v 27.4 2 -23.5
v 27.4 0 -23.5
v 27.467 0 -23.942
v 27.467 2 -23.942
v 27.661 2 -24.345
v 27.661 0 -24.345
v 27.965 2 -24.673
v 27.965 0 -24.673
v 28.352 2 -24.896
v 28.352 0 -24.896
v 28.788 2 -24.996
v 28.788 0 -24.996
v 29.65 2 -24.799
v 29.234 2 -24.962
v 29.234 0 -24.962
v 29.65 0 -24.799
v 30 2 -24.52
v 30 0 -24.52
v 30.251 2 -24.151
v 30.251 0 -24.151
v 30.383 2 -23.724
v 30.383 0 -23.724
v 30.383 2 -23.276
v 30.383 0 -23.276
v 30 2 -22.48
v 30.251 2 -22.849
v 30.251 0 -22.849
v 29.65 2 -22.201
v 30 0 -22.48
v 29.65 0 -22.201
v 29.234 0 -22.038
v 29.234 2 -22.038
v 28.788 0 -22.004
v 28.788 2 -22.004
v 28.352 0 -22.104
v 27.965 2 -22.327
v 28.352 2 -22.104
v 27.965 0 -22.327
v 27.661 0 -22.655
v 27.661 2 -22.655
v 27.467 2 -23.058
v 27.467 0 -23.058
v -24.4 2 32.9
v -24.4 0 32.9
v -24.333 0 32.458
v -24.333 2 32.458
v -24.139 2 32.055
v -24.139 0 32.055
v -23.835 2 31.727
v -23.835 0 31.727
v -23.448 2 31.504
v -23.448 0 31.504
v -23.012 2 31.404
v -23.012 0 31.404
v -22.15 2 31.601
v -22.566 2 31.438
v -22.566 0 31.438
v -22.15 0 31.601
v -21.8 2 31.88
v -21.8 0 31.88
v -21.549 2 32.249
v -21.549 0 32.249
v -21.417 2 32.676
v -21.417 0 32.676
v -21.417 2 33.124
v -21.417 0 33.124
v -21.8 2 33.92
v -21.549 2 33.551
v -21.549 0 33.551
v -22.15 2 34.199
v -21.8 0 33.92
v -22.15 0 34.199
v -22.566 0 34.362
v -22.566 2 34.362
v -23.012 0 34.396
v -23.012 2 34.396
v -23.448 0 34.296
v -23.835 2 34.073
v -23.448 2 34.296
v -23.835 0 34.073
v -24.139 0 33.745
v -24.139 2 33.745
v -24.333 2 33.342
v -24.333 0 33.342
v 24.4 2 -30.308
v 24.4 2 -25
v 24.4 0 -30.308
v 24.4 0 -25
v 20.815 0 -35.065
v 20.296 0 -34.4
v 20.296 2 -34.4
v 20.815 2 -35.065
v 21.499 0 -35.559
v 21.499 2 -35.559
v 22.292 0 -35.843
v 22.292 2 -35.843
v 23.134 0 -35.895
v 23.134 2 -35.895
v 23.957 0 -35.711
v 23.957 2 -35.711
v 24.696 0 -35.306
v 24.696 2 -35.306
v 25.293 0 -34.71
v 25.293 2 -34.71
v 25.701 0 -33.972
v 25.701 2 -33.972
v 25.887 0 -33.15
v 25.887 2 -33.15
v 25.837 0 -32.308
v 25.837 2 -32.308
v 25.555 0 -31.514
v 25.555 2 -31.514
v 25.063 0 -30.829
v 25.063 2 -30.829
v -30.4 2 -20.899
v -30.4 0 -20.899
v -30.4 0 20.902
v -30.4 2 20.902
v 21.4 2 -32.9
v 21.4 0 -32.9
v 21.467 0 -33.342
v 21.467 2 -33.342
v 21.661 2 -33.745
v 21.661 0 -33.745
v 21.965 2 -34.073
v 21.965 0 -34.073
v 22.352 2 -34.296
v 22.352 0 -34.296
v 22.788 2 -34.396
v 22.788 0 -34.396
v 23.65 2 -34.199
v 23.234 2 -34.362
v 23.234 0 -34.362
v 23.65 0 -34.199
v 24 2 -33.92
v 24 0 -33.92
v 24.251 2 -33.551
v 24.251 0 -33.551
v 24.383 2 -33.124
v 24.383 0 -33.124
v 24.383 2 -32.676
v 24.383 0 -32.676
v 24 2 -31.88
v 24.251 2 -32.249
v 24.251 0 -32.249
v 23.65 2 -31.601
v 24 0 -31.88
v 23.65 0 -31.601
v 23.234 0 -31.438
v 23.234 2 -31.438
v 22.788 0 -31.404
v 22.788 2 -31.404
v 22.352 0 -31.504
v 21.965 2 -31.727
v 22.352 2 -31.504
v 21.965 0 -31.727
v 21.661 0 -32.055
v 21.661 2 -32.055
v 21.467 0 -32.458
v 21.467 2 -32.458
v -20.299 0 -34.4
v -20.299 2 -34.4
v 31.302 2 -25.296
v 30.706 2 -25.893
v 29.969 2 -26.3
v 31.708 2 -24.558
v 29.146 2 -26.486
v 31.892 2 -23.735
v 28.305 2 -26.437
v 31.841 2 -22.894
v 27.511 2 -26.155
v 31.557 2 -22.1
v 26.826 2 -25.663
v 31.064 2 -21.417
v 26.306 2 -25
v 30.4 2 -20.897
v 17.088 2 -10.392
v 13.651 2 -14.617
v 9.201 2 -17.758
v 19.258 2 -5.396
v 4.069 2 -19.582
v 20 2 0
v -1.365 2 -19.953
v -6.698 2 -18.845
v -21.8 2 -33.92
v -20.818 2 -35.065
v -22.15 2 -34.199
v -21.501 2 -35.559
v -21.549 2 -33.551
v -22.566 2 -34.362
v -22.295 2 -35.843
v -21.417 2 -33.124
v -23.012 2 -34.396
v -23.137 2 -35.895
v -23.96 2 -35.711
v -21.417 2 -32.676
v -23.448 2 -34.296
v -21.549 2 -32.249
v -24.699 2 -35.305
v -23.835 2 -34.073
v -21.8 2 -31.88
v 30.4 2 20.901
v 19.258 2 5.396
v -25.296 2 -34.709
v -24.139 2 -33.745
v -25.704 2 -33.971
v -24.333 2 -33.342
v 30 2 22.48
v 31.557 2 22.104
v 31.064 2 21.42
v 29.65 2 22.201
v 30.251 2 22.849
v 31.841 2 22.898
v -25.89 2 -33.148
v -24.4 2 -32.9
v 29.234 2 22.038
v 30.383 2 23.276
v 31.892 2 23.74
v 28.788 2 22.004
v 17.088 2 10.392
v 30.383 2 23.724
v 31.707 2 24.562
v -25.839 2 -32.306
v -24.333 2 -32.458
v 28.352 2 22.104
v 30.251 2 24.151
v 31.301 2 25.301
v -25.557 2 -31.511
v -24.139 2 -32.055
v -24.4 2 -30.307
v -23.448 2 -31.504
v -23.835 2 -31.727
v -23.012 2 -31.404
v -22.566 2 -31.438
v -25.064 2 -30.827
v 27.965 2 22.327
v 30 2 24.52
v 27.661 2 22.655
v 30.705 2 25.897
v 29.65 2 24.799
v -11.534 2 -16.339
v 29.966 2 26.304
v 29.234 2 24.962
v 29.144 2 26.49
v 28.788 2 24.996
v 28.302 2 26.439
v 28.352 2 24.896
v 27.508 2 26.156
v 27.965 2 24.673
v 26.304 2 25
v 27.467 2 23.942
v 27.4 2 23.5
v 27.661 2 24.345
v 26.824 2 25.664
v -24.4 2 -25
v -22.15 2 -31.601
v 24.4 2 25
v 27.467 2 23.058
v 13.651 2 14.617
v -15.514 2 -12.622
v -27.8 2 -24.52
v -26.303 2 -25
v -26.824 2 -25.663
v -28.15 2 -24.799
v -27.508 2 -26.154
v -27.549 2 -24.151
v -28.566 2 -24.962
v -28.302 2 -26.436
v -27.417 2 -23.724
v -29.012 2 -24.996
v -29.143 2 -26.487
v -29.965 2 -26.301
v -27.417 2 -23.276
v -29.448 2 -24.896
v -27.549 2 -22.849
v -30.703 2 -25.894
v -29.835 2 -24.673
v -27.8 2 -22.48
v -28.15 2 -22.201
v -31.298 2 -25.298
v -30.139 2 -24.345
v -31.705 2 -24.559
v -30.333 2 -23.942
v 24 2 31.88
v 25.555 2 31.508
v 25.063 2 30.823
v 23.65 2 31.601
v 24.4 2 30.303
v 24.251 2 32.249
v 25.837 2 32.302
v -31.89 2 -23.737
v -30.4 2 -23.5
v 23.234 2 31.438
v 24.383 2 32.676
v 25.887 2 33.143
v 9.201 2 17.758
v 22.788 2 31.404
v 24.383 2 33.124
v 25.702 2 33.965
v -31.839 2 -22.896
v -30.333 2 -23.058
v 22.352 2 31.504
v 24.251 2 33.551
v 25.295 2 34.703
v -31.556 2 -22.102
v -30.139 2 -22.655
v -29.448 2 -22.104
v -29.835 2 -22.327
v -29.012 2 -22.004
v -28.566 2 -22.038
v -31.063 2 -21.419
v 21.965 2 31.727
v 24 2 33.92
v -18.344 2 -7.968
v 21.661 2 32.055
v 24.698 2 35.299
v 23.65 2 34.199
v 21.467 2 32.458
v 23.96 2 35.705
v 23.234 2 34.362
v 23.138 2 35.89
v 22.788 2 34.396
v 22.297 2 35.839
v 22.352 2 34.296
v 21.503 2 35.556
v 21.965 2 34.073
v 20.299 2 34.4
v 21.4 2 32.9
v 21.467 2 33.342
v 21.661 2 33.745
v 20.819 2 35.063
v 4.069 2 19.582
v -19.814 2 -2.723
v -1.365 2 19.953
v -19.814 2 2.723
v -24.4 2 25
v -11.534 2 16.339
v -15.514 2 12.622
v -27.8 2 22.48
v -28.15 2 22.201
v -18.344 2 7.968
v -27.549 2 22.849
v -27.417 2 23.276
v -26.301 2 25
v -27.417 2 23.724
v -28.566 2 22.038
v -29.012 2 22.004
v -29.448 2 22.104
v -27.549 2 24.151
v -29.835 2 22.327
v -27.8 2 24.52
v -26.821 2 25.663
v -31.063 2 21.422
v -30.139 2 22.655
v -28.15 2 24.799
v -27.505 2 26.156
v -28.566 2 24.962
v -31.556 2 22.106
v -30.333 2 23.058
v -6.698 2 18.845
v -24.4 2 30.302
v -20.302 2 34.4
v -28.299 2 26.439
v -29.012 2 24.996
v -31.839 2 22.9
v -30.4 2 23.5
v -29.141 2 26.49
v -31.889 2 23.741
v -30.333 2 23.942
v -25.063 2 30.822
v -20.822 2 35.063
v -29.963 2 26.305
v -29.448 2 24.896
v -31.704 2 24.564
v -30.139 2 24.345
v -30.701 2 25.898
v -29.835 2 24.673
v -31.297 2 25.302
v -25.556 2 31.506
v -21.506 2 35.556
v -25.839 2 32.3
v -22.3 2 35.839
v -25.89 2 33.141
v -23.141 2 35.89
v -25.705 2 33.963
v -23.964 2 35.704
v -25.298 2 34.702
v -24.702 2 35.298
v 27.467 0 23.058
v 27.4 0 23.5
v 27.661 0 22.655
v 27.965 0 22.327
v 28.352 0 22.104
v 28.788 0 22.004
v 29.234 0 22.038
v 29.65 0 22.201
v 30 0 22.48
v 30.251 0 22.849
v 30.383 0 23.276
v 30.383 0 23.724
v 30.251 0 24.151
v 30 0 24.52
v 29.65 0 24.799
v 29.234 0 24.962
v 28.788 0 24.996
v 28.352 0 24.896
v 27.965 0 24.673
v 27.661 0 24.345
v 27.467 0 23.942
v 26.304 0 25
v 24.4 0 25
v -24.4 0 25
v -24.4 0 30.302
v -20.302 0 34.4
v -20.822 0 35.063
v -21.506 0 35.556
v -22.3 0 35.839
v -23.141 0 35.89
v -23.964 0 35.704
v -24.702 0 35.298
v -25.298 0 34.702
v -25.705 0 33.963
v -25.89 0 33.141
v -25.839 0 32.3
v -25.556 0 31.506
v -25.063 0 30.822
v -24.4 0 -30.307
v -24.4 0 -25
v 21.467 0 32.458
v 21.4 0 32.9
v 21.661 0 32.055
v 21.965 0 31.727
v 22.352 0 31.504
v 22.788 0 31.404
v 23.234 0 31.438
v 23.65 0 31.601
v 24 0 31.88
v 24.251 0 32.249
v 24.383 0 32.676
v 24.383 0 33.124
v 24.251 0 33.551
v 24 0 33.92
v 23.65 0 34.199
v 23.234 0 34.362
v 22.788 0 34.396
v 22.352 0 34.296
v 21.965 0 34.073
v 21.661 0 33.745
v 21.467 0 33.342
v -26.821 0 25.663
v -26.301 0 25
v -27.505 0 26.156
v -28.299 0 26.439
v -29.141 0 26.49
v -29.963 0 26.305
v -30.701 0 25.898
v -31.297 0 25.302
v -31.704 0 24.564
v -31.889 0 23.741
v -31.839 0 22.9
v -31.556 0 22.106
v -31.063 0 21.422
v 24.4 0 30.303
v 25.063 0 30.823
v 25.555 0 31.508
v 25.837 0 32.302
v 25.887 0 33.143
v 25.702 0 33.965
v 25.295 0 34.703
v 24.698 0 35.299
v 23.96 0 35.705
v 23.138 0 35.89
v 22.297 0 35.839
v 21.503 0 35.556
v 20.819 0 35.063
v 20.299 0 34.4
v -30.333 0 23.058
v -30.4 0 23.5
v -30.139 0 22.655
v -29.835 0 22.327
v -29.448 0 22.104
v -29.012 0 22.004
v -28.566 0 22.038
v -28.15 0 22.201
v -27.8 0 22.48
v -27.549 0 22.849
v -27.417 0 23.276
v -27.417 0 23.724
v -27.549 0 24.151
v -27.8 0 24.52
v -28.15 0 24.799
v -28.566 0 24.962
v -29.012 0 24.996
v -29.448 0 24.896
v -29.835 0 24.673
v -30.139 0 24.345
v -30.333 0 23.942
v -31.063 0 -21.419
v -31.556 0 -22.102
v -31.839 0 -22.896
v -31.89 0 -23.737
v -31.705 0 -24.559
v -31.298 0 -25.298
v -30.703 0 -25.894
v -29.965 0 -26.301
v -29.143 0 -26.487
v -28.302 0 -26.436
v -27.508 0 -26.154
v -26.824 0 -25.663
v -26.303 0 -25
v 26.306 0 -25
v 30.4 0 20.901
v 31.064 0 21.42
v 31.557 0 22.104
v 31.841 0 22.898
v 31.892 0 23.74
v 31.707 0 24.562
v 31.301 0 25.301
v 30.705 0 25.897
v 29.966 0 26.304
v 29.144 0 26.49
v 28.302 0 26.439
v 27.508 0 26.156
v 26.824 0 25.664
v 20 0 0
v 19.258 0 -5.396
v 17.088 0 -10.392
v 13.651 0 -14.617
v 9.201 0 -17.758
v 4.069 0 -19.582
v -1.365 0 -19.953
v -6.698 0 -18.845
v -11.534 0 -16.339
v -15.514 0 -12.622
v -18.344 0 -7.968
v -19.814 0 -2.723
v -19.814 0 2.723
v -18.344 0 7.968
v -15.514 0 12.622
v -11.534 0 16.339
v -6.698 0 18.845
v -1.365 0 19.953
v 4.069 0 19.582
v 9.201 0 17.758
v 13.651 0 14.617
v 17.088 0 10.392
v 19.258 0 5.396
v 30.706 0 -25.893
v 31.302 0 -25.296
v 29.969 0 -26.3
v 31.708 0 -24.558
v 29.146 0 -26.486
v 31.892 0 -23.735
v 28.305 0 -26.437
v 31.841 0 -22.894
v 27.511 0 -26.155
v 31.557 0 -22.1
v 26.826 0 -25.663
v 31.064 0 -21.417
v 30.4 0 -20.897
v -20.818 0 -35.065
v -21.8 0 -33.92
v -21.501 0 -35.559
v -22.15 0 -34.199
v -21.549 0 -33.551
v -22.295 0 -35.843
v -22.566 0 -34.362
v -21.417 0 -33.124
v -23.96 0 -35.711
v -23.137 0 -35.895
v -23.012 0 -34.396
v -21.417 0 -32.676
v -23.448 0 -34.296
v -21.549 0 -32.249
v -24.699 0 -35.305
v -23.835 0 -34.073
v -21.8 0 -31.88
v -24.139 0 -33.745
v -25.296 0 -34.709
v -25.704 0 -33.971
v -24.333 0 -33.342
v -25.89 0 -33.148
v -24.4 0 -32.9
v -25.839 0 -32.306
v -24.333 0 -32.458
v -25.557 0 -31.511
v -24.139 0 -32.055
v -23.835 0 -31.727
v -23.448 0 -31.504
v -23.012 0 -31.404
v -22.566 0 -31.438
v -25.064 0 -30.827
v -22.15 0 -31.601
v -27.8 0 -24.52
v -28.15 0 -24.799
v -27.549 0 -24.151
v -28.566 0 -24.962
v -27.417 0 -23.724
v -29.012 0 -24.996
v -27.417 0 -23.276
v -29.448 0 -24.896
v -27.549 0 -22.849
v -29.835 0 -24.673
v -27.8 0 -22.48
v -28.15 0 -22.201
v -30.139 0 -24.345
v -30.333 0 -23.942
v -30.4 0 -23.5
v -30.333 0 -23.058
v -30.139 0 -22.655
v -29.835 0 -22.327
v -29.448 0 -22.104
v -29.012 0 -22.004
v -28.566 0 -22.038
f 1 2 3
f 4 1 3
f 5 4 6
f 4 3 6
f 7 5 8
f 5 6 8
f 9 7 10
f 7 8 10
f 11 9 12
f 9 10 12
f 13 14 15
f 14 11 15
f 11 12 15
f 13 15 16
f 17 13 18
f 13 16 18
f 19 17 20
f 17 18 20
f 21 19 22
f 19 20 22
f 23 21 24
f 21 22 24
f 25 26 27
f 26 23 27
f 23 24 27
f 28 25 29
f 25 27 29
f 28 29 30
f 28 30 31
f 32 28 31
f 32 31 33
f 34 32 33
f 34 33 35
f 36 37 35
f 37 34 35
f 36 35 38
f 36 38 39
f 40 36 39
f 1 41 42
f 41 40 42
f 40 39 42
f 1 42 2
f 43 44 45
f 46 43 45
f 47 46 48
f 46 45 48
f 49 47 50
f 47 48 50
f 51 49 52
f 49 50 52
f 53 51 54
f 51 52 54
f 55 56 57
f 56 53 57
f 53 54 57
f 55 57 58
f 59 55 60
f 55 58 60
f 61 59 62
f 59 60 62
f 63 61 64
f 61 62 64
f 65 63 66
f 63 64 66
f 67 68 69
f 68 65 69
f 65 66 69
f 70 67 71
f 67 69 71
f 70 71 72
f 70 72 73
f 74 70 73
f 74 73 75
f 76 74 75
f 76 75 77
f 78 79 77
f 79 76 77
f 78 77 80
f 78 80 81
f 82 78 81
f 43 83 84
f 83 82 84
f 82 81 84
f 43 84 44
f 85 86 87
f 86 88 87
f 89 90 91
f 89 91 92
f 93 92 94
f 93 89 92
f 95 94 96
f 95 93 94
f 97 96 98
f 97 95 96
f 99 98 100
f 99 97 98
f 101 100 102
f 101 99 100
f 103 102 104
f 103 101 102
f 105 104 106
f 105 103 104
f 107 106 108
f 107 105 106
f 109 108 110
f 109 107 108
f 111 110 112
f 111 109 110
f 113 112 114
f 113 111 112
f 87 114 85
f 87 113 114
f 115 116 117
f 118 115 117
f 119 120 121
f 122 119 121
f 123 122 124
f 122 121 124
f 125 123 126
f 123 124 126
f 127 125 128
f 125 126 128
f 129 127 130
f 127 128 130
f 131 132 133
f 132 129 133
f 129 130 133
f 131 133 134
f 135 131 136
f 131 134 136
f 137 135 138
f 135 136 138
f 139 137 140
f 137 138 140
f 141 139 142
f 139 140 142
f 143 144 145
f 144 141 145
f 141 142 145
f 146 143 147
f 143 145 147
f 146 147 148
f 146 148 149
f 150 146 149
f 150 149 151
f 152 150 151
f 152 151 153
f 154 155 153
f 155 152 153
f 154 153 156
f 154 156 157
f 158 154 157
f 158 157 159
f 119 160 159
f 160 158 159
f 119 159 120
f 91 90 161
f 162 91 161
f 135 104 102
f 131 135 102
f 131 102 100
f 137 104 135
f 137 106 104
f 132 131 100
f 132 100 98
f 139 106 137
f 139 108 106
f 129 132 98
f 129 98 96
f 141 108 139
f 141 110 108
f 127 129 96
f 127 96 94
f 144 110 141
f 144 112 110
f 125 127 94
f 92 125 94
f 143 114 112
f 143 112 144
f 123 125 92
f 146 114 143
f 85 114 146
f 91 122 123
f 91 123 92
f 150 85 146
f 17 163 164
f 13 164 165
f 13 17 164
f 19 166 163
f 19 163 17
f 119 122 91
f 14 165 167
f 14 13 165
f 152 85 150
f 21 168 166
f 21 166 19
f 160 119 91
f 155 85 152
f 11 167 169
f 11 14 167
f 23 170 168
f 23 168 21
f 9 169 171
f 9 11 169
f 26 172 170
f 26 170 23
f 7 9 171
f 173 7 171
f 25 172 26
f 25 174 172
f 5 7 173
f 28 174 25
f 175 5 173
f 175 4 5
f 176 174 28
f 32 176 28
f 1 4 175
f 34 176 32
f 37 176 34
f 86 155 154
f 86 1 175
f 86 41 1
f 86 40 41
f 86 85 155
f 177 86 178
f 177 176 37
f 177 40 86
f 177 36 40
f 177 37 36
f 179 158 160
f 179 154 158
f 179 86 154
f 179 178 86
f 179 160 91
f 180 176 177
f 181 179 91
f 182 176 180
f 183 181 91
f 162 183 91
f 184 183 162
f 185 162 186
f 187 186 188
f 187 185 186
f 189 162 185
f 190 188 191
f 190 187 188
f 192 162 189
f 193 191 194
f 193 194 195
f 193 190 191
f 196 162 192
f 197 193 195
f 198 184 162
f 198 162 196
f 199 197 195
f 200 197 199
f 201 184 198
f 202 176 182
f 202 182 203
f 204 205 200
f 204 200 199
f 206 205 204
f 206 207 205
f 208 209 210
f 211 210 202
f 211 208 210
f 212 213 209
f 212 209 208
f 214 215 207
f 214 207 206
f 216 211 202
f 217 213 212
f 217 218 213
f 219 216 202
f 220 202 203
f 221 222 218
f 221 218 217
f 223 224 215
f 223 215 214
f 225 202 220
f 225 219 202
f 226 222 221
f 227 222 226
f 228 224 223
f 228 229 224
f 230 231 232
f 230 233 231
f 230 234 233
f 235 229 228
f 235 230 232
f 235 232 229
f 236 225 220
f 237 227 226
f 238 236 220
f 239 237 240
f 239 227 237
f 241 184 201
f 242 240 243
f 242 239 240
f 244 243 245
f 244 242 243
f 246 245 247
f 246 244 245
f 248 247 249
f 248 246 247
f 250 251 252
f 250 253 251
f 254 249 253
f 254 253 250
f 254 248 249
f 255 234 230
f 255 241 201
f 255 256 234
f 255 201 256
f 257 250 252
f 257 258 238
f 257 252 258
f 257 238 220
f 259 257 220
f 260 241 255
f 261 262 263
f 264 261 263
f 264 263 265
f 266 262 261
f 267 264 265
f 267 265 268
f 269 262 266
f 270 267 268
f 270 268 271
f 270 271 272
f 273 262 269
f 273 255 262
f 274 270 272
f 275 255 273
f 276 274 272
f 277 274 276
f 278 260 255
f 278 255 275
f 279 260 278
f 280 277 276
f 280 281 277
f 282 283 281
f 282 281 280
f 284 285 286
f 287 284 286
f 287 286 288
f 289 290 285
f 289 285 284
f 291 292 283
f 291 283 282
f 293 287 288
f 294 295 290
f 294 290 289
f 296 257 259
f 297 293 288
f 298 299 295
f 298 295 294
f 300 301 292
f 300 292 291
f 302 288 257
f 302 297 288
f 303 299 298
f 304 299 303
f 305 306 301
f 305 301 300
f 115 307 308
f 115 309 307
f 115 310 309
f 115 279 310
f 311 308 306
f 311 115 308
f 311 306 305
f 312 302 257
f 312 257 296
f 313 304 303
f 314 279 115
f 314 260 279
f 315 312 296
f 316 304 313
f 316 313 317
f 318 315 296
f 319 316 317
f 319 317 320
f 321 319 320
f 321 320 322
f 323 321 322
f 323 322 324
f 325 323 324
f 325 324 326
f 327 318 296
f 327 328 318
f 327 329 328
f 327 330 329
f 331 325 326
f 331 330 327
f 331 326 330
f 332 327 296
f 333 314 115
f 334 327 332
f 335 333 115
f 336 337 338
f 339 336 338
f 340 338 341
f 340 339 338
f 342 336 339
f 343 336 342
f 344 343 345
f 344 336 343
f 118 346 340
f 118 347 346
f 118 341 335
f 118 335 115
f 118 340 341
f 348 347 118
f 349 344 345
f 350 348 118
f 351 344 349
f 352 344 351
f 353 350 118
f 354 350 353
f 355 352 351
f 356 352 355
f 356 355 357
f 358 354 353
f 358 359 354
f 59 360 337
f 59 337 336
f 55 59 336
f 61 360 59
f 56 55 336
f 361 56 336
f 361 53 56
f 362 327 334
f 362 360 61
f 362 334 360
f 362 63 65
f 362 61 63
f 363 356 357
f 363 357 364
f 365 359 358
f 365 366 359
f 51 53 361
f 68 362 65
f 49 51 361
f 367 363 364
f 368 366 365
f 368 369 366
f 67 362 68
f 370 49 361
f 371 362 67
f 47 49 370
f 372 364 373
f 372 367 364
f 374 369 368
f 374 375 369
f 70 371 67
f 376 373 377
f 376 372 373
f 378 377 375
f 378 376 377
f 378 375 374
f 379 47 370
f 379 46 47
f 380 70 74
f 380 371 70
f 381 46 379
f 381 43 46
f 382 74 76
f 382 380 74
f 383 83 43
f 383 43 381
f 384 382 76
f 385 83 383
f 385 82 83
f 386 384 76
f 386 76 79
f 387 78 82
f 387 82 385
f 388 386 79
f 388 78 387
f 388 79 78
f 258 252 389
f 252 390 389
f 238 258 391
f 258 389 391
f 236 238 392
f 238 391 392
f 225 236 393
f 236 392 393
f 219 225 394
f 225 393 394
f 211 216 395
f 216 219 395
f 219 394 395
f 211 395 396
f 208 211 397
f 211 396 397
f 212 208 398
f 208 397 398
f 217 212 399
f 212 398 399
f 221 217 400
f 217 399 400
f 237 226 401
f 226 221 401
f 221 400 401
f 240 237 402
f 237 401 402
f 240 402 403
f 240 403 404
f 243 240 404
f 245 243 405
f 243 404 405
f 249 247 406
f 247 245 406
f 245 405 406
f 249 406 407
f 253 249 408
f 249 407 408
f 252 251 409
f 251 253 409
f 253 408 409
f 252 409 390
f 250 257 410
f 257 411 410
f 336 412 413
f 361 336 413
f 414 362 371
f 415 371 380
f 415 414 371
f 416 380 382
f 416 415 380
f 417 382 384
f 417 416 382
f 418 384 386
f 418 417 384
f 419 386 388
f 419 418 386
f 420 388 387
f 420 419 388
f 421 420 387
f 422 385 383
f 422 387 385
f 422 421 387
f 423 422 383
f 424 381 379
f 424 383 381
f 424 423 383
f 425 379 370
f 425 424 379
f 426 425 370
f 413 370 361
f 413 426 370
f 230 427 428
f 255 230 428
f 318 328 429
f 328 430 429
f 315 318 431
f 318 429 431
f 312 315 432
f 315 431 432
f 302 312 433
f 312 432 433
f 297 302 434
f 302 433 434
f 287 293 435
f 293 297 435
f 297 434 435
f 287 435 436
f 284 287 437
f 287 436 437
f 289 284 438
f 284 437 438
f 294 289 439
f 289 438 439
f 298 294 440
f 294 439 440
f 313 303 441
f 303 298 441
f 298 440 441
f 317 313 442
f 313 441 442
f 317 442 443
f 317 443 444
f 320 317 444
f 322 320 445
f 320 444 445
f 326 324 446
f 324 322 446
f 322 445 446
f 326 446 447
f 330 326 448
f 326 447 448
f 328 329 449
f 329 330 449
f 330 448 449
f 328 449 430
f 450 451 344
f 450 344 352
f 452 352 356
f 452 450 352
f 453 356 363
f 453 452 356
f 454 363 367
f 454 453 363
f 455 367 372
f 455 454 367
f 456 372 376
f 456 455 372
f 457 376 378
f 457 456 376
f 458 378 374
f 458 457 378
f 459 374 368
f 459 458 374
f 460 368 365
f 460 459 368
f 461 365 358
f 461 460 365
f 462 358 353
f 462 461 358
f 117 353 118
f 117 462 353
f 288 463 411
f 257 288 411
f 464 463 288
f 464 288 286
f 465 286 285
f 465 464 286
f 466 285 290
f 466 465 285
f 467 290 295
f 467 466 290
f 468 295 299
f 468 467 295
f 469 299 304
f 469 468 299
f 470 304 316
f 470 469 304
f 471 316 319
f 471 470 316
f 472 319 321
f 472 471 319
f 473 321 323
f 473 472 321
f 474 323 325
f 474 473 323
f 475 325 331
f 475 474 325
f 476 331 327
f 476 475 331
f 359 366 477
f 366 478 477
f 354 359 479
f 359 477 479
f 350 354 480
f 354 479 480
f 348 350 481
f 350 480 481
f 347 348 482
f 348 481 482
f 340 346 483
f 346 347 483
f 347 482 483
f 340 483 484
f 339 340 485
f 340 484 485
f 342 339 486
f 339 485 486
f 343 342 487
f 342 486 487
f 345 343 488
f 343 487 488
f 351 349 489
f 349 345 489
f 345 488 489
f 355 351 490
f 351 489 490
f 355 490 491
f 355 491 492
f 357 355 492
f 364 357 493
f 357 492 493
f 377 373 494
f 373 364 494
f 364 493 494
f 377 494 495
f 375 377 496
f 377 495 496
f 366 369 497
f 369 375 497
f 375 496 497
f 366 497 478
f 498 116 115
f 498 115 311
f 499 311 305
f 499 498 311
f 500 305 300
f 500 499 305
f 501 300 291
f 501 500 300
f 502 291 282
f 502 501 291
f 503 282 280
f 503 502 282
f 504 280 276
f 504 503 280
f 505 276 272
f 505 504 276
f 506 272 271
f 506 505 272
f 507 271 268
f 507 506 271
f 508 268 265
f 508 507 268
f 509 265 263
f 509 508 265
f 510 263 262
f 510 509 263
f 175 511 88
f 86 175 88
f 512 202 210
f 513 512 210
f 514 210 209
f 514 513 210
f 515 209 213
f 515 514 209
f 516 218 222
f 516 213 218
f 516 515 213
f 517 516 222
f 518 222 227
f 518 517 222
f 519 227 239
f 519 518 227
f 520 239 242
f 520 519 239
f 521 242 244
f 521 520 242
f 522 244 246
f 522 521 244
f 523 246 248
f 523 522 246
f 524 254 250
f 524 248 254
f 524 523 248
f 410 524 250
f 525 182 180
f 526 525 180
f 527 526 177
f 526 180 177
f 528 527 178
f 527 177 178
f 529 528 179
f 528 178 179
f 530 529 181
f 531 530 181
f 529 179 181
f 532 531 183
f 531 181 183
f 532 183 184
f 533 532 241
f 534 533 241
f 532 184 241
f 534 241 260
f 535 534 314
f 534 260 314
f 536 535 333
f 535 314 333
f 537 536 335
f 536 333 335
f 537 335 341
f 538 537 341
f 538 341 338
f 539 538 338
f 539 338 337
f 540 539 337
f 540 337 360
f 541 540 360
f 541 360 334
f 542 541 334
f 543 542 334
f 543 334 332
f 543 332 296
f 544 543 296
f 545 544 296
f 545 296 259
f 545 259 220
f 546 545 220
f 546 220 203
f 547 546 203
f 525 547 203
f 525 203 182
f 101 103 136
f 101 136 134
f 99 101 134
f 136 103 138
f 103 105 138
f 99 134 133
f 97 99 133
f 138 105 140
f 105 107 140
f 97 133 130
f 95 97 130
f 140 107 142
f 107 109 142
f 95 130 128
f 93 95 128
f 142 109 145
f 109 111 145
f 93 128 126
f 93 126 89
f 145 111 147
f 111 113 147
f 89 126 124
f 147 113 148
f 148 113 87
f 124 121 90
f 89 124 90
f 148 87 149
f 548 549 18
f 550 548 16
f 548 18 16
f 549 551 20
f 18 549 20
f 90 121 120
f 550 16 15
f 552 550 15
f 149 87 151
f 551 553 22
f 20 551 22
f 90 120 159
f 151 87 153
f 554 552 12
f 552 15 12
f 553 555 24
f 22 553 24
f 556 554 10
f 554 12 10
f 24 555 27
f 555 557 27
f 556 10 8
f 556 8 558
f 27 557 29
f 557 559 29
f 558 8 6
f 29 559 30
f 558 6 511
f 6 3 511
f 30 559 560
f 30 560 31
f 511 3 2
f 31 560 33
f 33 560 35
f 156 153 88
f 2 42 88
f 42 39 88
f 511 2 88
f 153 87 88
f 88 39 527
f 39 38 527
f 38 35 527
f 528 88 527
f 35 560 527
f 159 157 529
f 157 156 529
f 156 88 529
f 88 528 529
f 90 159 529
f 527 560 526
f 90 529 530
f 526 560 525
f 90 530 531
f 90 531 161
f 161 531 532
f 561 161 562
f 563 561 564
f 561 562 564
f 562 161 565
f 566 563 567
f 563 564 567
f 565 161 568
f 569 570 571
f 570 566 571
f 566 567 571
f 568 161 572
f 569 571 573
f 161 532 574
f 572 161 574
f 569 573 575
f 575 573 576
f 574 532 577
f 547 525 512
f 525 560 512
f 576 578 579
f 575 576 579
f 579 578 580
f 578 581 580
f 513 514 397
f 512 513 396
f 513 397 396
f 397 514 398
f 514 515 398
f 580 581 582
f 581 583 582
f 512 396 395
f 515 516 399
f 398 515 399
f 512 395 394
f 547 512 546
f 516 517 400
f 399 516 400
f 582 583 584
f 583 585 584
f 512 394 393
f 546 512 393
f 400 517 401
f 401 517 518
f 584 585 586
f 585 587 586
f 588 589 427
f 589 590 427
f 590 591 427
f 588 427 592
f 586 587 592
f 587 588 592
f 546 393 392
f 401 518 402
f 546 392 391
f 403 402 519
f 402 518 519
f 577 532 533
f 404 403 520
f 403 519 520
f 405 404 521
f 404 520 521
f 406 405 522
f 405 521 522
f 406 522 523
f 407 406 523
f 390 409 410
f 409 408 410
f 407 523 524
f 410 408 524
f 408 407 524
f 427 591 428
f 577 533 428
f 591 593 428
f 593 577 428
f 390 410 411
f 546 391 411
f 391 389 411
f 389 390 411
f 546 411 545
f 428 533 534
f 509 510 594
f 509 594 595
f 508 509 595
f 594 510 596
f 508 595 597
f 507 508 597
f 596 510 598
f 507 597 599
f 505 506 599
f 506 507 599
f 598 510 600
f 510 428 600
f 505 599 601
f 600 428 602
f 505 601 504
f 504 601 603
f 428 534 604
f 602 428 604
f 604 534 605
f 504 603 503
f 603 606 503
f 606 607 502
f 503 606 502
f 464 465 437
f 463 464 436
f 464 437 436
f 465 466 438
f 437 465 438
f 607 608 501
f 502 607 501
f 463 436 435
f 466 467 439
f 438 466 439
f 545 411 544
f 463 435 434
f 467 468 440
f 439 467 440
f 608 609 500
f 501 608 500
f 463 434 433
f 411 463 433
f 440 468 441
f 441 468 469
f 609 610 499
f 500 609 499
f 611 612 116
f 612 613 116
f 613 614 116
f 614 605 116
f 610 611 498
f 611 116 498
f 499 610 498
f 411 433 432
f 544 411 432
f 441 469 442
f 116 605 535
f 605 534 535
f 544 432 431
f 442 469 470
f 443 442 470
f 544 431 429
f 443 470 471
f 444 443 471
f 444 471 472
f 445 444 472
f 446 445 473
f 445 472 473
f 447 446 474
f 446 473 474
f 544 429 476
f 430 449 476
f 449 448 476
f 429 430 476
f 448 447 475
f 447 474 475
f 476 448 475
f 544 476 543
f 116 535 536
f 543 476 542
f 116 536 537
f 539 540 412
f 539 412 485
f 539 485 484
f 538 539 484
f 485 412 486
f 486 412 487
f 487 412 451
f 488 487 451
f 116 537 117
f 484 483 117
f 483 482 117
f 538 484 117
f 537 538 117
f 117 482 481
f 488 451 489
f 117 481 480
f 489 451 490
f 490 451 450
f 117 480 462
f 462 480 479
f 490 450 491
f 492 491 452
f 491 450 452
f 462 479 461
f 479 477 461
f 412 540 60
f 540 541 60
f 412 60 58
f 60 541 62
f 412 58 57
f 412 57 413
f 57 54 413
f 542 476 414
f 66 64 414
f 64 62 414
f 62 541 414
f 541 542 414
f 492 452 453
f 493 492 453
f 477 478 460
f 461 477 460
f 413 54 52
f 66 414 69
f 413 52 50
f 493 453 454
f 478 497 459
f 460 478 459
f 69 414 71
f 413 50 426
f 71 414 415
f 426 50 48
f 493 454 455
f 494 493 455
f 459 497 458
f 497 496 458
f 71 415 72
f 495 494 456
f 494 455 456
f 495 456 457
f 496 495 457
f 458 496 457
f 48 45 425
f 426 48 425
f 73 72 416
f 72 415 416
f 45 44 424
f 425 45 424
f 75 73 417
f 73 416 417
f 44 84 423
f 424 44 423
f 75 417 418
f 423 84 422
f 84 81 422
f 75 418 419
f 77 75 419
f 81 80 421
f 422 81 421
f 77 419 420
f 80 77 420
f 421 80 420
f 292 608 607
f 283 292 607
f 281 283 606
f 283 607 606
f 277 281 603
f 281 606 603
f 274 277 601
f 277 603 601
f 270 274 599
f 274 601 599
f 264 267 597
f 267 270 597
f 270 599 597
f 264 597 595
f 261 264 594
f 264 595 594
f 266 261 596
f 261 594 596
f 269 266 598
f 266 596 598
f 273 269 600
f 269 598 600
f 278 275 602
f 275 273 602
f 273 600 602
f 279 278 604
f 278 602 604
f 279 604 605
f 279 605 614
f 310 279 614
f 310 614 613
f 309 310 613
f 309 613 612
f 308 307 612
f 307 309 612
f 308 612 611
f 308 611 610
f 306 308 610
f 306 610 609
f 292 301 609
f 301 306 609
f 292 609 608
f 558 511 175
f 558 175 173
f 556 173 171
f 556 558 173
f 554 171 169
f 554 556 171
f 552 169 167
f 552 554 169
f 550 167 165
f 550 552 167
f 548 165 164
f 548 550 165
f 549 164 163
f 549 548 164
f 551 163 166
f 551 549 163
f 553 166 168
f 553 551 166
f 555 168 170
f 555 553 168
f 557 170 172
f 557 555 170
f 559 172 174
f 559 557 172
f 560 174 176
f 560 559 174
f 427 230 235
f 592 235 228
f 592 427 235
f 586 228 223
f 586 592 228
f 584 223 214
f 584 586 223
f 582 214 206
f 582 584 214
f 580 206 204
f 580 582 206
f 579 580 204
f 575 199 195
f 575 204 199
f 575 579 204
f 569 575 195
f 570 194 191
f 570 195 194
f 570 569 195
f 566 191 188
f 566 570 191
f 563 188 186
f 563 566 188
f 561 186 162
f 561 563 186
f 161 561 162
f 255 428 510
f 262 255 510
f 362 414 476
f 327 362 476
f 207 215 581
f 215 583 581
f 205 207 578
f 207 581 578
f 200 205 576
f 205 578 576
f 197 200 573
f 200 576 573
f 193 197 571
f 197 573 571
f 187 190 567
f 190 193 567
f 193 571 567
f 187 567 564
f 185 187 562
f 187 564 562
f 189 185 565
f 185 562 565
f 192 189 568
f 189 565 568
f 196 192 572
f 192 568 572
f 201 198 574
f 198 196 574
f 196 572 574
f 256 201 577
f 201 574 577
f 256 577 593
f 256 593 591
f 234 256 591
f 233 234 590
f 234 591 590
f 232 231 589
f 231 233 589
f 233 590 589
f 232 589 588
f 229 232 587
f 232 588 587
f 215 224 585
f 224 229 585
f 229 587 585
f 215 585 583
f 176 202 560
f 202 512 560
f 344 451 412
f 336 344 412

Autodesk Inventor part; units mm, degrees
ref_plane "YZ Plane" through (0, 0, 0) normal (1, 0, 0) x (0, 1, 0)
ref_plane "XZ Plane" through (0, 0, 0) normal (0, 1, 0) x (-1, 0, 0)
ref_plane "XY Plane" through (0, 0, 0) normal (0, 0, 1) x (1, 0, 0)
sketch "Sketch5" plane through (0, 0, 0) normal (0, 1, 0) x (-1, 0, 0)
  line L0 (-22.9, -32.9) -> (22.9, 32.9) construction
  line L1 (22.9, -32.9) -> (-22.9, 32.9) construction
  circle A0 centre (22.9, 32.9) radius 1.5
  circle A1 centre (22.9, -32.9) radius 1.5
  circle A2 centre (-22.9, 32.9) radius 1.5
  circle A3 centre (-22.9, -32.9) radius 1.5
  point P0 (0, 0)
  dimension "d6" = 45.8
  dimension "d7" = 65.8
  dimension "d8" = 3
  dimension "d9" = 3
  dimension "d10" = 3
  dimension "d11" = 3
sketch "Sketch8" plane through (0, 0, 0) normal (0, 1, 0) x (-1, 0, 0)
  line L0 (28.9, -23.5) -> (-28.9, 23.5) construction
  line L1 (-28.9, -23.5) -> (28.9, 23.5) construction
  circle A0 centre (28.9, 23.5) radius 1.5
  circle A1 centre (28.9, -23.5) radius 1.5
  circle A2 centre (-28.9, 23.5) radius 1.5
  circle A3 centre (-28.9, -23.5) radius 1.5
  point P0 (0, 0)
  dimension "d24" = 57.8
  dimension "d25" = 47
  dimension "d26" = 3
  dimension "d27" = 3
  dimension "d28" = 3
  dimension "d29" = 3
sketch "Sketch10" plane through (0, 0, 0) normal (0, 1, 0) x (-1, 0, 0)
  line L0 (-24.4, -34.4) -> (24.4, -34.4)
  line L1 (24.4, -34.4) -> (24.4, 34.4)
  line L2 (24.4, 34.4) -> (-24.4, 34.4)
  line L3 (-24.4, 34.4) -> (-24.4, -34.4)
  line L4 (-24.4, -34.4) -> (24.4, 34.4) construction
  line L5 (24.4, -34.4) -> (-24.4, 34.4) construction
  line L6 (-30.4, -25) -> (30.4, -25)
  line L7 (30.4, -25) -> (30.4, 25)
  line L8 (30.4, 25) -> (-30.4, 25)
  line L9 (-30.4, 25) -> (-30.4, -25)
  line L10 (-30.4, -25) -> (30.4, 25) construction
  line L11 (30.4, -25) -> (-30.4, 25) construction
  circle A0 centre (28.8992, 23.4996) radius 3
  circle A1 centre (22.8996, 32.8995) radius 3
  circle A2 centre (28.8992, -23.4965) radius 3
  circle A3 centre (22.8996, -32.9046) radius 3
  circle A4 centre (-28.9017, -23.4965) radius 3
  circle A5 centre (-22.8972, -32.9046) radius 3
  circle A6 centre (-28.9017, 23.4996) radius 3
  circle A7 centre (-22.8972, 32.8995) radius 3
  point P0 (0, 0)
  point P1 (24.4, 25)
  point P2 (24.4, 30.3016)
  point P3 (20.3018, 34.4)
  point P4 (-20.2994, 34.4)
  point P5 (-24.4, 30.303)
  point P6 (-24.4, 25)
  point P7 (-26.3038, 25)
  point P8 (-30.4, 20.9006)
  point P9 (-30.4, -20.8974)
  point P10 (-26.3056, -25)
  point P11 (-24.4, -25)
  point P12 (-24.4, -30.3081)
  point P13 (-20.2965, -34.4)
  point P14 (20.2989, -34.4)
  point P15 (24.4, -30.3067)
  point P16 (24.4, -25)
  point P17 (26.3031, -25)
  point P18 (30.4, -20.8989)
  point P19 (30.4, 20.902)
  point P20 (26.3013, 25)
  dimension "d46" = 48.8
  dimension "d47" = 68.8
  dimension "d48" = 60.8
  dimension "d49" = 50
  dimension "d50" = 6
  dimension "d51" = 6
  dimension "d52" = 6
  dimension "d53" = 6
  dimension "d54" = 6
  dimension "d55" = 6
  dimension "d56" = 6
  dimension "d57" = 6
extrude "Extrusion3" add sketch "Sketch10" along normal blind 2
extrude "Extrusion4" cut sketch "Sketch5" along normal blind 2
extrude "Extrusion5" cut sketch "Sketch8" along normal blind 2
sketch "Sketch11" plane through (0, 2, 0) normal (0, 1, 0) x (1, 0, 0)
  circle A0 centre (0, 0) radius 20
  dimension "d64" = 40
extrude "Extrusion6" cut sketch "Sketch11" against normal blind 2
properties part number "PCB Bracket 2"
